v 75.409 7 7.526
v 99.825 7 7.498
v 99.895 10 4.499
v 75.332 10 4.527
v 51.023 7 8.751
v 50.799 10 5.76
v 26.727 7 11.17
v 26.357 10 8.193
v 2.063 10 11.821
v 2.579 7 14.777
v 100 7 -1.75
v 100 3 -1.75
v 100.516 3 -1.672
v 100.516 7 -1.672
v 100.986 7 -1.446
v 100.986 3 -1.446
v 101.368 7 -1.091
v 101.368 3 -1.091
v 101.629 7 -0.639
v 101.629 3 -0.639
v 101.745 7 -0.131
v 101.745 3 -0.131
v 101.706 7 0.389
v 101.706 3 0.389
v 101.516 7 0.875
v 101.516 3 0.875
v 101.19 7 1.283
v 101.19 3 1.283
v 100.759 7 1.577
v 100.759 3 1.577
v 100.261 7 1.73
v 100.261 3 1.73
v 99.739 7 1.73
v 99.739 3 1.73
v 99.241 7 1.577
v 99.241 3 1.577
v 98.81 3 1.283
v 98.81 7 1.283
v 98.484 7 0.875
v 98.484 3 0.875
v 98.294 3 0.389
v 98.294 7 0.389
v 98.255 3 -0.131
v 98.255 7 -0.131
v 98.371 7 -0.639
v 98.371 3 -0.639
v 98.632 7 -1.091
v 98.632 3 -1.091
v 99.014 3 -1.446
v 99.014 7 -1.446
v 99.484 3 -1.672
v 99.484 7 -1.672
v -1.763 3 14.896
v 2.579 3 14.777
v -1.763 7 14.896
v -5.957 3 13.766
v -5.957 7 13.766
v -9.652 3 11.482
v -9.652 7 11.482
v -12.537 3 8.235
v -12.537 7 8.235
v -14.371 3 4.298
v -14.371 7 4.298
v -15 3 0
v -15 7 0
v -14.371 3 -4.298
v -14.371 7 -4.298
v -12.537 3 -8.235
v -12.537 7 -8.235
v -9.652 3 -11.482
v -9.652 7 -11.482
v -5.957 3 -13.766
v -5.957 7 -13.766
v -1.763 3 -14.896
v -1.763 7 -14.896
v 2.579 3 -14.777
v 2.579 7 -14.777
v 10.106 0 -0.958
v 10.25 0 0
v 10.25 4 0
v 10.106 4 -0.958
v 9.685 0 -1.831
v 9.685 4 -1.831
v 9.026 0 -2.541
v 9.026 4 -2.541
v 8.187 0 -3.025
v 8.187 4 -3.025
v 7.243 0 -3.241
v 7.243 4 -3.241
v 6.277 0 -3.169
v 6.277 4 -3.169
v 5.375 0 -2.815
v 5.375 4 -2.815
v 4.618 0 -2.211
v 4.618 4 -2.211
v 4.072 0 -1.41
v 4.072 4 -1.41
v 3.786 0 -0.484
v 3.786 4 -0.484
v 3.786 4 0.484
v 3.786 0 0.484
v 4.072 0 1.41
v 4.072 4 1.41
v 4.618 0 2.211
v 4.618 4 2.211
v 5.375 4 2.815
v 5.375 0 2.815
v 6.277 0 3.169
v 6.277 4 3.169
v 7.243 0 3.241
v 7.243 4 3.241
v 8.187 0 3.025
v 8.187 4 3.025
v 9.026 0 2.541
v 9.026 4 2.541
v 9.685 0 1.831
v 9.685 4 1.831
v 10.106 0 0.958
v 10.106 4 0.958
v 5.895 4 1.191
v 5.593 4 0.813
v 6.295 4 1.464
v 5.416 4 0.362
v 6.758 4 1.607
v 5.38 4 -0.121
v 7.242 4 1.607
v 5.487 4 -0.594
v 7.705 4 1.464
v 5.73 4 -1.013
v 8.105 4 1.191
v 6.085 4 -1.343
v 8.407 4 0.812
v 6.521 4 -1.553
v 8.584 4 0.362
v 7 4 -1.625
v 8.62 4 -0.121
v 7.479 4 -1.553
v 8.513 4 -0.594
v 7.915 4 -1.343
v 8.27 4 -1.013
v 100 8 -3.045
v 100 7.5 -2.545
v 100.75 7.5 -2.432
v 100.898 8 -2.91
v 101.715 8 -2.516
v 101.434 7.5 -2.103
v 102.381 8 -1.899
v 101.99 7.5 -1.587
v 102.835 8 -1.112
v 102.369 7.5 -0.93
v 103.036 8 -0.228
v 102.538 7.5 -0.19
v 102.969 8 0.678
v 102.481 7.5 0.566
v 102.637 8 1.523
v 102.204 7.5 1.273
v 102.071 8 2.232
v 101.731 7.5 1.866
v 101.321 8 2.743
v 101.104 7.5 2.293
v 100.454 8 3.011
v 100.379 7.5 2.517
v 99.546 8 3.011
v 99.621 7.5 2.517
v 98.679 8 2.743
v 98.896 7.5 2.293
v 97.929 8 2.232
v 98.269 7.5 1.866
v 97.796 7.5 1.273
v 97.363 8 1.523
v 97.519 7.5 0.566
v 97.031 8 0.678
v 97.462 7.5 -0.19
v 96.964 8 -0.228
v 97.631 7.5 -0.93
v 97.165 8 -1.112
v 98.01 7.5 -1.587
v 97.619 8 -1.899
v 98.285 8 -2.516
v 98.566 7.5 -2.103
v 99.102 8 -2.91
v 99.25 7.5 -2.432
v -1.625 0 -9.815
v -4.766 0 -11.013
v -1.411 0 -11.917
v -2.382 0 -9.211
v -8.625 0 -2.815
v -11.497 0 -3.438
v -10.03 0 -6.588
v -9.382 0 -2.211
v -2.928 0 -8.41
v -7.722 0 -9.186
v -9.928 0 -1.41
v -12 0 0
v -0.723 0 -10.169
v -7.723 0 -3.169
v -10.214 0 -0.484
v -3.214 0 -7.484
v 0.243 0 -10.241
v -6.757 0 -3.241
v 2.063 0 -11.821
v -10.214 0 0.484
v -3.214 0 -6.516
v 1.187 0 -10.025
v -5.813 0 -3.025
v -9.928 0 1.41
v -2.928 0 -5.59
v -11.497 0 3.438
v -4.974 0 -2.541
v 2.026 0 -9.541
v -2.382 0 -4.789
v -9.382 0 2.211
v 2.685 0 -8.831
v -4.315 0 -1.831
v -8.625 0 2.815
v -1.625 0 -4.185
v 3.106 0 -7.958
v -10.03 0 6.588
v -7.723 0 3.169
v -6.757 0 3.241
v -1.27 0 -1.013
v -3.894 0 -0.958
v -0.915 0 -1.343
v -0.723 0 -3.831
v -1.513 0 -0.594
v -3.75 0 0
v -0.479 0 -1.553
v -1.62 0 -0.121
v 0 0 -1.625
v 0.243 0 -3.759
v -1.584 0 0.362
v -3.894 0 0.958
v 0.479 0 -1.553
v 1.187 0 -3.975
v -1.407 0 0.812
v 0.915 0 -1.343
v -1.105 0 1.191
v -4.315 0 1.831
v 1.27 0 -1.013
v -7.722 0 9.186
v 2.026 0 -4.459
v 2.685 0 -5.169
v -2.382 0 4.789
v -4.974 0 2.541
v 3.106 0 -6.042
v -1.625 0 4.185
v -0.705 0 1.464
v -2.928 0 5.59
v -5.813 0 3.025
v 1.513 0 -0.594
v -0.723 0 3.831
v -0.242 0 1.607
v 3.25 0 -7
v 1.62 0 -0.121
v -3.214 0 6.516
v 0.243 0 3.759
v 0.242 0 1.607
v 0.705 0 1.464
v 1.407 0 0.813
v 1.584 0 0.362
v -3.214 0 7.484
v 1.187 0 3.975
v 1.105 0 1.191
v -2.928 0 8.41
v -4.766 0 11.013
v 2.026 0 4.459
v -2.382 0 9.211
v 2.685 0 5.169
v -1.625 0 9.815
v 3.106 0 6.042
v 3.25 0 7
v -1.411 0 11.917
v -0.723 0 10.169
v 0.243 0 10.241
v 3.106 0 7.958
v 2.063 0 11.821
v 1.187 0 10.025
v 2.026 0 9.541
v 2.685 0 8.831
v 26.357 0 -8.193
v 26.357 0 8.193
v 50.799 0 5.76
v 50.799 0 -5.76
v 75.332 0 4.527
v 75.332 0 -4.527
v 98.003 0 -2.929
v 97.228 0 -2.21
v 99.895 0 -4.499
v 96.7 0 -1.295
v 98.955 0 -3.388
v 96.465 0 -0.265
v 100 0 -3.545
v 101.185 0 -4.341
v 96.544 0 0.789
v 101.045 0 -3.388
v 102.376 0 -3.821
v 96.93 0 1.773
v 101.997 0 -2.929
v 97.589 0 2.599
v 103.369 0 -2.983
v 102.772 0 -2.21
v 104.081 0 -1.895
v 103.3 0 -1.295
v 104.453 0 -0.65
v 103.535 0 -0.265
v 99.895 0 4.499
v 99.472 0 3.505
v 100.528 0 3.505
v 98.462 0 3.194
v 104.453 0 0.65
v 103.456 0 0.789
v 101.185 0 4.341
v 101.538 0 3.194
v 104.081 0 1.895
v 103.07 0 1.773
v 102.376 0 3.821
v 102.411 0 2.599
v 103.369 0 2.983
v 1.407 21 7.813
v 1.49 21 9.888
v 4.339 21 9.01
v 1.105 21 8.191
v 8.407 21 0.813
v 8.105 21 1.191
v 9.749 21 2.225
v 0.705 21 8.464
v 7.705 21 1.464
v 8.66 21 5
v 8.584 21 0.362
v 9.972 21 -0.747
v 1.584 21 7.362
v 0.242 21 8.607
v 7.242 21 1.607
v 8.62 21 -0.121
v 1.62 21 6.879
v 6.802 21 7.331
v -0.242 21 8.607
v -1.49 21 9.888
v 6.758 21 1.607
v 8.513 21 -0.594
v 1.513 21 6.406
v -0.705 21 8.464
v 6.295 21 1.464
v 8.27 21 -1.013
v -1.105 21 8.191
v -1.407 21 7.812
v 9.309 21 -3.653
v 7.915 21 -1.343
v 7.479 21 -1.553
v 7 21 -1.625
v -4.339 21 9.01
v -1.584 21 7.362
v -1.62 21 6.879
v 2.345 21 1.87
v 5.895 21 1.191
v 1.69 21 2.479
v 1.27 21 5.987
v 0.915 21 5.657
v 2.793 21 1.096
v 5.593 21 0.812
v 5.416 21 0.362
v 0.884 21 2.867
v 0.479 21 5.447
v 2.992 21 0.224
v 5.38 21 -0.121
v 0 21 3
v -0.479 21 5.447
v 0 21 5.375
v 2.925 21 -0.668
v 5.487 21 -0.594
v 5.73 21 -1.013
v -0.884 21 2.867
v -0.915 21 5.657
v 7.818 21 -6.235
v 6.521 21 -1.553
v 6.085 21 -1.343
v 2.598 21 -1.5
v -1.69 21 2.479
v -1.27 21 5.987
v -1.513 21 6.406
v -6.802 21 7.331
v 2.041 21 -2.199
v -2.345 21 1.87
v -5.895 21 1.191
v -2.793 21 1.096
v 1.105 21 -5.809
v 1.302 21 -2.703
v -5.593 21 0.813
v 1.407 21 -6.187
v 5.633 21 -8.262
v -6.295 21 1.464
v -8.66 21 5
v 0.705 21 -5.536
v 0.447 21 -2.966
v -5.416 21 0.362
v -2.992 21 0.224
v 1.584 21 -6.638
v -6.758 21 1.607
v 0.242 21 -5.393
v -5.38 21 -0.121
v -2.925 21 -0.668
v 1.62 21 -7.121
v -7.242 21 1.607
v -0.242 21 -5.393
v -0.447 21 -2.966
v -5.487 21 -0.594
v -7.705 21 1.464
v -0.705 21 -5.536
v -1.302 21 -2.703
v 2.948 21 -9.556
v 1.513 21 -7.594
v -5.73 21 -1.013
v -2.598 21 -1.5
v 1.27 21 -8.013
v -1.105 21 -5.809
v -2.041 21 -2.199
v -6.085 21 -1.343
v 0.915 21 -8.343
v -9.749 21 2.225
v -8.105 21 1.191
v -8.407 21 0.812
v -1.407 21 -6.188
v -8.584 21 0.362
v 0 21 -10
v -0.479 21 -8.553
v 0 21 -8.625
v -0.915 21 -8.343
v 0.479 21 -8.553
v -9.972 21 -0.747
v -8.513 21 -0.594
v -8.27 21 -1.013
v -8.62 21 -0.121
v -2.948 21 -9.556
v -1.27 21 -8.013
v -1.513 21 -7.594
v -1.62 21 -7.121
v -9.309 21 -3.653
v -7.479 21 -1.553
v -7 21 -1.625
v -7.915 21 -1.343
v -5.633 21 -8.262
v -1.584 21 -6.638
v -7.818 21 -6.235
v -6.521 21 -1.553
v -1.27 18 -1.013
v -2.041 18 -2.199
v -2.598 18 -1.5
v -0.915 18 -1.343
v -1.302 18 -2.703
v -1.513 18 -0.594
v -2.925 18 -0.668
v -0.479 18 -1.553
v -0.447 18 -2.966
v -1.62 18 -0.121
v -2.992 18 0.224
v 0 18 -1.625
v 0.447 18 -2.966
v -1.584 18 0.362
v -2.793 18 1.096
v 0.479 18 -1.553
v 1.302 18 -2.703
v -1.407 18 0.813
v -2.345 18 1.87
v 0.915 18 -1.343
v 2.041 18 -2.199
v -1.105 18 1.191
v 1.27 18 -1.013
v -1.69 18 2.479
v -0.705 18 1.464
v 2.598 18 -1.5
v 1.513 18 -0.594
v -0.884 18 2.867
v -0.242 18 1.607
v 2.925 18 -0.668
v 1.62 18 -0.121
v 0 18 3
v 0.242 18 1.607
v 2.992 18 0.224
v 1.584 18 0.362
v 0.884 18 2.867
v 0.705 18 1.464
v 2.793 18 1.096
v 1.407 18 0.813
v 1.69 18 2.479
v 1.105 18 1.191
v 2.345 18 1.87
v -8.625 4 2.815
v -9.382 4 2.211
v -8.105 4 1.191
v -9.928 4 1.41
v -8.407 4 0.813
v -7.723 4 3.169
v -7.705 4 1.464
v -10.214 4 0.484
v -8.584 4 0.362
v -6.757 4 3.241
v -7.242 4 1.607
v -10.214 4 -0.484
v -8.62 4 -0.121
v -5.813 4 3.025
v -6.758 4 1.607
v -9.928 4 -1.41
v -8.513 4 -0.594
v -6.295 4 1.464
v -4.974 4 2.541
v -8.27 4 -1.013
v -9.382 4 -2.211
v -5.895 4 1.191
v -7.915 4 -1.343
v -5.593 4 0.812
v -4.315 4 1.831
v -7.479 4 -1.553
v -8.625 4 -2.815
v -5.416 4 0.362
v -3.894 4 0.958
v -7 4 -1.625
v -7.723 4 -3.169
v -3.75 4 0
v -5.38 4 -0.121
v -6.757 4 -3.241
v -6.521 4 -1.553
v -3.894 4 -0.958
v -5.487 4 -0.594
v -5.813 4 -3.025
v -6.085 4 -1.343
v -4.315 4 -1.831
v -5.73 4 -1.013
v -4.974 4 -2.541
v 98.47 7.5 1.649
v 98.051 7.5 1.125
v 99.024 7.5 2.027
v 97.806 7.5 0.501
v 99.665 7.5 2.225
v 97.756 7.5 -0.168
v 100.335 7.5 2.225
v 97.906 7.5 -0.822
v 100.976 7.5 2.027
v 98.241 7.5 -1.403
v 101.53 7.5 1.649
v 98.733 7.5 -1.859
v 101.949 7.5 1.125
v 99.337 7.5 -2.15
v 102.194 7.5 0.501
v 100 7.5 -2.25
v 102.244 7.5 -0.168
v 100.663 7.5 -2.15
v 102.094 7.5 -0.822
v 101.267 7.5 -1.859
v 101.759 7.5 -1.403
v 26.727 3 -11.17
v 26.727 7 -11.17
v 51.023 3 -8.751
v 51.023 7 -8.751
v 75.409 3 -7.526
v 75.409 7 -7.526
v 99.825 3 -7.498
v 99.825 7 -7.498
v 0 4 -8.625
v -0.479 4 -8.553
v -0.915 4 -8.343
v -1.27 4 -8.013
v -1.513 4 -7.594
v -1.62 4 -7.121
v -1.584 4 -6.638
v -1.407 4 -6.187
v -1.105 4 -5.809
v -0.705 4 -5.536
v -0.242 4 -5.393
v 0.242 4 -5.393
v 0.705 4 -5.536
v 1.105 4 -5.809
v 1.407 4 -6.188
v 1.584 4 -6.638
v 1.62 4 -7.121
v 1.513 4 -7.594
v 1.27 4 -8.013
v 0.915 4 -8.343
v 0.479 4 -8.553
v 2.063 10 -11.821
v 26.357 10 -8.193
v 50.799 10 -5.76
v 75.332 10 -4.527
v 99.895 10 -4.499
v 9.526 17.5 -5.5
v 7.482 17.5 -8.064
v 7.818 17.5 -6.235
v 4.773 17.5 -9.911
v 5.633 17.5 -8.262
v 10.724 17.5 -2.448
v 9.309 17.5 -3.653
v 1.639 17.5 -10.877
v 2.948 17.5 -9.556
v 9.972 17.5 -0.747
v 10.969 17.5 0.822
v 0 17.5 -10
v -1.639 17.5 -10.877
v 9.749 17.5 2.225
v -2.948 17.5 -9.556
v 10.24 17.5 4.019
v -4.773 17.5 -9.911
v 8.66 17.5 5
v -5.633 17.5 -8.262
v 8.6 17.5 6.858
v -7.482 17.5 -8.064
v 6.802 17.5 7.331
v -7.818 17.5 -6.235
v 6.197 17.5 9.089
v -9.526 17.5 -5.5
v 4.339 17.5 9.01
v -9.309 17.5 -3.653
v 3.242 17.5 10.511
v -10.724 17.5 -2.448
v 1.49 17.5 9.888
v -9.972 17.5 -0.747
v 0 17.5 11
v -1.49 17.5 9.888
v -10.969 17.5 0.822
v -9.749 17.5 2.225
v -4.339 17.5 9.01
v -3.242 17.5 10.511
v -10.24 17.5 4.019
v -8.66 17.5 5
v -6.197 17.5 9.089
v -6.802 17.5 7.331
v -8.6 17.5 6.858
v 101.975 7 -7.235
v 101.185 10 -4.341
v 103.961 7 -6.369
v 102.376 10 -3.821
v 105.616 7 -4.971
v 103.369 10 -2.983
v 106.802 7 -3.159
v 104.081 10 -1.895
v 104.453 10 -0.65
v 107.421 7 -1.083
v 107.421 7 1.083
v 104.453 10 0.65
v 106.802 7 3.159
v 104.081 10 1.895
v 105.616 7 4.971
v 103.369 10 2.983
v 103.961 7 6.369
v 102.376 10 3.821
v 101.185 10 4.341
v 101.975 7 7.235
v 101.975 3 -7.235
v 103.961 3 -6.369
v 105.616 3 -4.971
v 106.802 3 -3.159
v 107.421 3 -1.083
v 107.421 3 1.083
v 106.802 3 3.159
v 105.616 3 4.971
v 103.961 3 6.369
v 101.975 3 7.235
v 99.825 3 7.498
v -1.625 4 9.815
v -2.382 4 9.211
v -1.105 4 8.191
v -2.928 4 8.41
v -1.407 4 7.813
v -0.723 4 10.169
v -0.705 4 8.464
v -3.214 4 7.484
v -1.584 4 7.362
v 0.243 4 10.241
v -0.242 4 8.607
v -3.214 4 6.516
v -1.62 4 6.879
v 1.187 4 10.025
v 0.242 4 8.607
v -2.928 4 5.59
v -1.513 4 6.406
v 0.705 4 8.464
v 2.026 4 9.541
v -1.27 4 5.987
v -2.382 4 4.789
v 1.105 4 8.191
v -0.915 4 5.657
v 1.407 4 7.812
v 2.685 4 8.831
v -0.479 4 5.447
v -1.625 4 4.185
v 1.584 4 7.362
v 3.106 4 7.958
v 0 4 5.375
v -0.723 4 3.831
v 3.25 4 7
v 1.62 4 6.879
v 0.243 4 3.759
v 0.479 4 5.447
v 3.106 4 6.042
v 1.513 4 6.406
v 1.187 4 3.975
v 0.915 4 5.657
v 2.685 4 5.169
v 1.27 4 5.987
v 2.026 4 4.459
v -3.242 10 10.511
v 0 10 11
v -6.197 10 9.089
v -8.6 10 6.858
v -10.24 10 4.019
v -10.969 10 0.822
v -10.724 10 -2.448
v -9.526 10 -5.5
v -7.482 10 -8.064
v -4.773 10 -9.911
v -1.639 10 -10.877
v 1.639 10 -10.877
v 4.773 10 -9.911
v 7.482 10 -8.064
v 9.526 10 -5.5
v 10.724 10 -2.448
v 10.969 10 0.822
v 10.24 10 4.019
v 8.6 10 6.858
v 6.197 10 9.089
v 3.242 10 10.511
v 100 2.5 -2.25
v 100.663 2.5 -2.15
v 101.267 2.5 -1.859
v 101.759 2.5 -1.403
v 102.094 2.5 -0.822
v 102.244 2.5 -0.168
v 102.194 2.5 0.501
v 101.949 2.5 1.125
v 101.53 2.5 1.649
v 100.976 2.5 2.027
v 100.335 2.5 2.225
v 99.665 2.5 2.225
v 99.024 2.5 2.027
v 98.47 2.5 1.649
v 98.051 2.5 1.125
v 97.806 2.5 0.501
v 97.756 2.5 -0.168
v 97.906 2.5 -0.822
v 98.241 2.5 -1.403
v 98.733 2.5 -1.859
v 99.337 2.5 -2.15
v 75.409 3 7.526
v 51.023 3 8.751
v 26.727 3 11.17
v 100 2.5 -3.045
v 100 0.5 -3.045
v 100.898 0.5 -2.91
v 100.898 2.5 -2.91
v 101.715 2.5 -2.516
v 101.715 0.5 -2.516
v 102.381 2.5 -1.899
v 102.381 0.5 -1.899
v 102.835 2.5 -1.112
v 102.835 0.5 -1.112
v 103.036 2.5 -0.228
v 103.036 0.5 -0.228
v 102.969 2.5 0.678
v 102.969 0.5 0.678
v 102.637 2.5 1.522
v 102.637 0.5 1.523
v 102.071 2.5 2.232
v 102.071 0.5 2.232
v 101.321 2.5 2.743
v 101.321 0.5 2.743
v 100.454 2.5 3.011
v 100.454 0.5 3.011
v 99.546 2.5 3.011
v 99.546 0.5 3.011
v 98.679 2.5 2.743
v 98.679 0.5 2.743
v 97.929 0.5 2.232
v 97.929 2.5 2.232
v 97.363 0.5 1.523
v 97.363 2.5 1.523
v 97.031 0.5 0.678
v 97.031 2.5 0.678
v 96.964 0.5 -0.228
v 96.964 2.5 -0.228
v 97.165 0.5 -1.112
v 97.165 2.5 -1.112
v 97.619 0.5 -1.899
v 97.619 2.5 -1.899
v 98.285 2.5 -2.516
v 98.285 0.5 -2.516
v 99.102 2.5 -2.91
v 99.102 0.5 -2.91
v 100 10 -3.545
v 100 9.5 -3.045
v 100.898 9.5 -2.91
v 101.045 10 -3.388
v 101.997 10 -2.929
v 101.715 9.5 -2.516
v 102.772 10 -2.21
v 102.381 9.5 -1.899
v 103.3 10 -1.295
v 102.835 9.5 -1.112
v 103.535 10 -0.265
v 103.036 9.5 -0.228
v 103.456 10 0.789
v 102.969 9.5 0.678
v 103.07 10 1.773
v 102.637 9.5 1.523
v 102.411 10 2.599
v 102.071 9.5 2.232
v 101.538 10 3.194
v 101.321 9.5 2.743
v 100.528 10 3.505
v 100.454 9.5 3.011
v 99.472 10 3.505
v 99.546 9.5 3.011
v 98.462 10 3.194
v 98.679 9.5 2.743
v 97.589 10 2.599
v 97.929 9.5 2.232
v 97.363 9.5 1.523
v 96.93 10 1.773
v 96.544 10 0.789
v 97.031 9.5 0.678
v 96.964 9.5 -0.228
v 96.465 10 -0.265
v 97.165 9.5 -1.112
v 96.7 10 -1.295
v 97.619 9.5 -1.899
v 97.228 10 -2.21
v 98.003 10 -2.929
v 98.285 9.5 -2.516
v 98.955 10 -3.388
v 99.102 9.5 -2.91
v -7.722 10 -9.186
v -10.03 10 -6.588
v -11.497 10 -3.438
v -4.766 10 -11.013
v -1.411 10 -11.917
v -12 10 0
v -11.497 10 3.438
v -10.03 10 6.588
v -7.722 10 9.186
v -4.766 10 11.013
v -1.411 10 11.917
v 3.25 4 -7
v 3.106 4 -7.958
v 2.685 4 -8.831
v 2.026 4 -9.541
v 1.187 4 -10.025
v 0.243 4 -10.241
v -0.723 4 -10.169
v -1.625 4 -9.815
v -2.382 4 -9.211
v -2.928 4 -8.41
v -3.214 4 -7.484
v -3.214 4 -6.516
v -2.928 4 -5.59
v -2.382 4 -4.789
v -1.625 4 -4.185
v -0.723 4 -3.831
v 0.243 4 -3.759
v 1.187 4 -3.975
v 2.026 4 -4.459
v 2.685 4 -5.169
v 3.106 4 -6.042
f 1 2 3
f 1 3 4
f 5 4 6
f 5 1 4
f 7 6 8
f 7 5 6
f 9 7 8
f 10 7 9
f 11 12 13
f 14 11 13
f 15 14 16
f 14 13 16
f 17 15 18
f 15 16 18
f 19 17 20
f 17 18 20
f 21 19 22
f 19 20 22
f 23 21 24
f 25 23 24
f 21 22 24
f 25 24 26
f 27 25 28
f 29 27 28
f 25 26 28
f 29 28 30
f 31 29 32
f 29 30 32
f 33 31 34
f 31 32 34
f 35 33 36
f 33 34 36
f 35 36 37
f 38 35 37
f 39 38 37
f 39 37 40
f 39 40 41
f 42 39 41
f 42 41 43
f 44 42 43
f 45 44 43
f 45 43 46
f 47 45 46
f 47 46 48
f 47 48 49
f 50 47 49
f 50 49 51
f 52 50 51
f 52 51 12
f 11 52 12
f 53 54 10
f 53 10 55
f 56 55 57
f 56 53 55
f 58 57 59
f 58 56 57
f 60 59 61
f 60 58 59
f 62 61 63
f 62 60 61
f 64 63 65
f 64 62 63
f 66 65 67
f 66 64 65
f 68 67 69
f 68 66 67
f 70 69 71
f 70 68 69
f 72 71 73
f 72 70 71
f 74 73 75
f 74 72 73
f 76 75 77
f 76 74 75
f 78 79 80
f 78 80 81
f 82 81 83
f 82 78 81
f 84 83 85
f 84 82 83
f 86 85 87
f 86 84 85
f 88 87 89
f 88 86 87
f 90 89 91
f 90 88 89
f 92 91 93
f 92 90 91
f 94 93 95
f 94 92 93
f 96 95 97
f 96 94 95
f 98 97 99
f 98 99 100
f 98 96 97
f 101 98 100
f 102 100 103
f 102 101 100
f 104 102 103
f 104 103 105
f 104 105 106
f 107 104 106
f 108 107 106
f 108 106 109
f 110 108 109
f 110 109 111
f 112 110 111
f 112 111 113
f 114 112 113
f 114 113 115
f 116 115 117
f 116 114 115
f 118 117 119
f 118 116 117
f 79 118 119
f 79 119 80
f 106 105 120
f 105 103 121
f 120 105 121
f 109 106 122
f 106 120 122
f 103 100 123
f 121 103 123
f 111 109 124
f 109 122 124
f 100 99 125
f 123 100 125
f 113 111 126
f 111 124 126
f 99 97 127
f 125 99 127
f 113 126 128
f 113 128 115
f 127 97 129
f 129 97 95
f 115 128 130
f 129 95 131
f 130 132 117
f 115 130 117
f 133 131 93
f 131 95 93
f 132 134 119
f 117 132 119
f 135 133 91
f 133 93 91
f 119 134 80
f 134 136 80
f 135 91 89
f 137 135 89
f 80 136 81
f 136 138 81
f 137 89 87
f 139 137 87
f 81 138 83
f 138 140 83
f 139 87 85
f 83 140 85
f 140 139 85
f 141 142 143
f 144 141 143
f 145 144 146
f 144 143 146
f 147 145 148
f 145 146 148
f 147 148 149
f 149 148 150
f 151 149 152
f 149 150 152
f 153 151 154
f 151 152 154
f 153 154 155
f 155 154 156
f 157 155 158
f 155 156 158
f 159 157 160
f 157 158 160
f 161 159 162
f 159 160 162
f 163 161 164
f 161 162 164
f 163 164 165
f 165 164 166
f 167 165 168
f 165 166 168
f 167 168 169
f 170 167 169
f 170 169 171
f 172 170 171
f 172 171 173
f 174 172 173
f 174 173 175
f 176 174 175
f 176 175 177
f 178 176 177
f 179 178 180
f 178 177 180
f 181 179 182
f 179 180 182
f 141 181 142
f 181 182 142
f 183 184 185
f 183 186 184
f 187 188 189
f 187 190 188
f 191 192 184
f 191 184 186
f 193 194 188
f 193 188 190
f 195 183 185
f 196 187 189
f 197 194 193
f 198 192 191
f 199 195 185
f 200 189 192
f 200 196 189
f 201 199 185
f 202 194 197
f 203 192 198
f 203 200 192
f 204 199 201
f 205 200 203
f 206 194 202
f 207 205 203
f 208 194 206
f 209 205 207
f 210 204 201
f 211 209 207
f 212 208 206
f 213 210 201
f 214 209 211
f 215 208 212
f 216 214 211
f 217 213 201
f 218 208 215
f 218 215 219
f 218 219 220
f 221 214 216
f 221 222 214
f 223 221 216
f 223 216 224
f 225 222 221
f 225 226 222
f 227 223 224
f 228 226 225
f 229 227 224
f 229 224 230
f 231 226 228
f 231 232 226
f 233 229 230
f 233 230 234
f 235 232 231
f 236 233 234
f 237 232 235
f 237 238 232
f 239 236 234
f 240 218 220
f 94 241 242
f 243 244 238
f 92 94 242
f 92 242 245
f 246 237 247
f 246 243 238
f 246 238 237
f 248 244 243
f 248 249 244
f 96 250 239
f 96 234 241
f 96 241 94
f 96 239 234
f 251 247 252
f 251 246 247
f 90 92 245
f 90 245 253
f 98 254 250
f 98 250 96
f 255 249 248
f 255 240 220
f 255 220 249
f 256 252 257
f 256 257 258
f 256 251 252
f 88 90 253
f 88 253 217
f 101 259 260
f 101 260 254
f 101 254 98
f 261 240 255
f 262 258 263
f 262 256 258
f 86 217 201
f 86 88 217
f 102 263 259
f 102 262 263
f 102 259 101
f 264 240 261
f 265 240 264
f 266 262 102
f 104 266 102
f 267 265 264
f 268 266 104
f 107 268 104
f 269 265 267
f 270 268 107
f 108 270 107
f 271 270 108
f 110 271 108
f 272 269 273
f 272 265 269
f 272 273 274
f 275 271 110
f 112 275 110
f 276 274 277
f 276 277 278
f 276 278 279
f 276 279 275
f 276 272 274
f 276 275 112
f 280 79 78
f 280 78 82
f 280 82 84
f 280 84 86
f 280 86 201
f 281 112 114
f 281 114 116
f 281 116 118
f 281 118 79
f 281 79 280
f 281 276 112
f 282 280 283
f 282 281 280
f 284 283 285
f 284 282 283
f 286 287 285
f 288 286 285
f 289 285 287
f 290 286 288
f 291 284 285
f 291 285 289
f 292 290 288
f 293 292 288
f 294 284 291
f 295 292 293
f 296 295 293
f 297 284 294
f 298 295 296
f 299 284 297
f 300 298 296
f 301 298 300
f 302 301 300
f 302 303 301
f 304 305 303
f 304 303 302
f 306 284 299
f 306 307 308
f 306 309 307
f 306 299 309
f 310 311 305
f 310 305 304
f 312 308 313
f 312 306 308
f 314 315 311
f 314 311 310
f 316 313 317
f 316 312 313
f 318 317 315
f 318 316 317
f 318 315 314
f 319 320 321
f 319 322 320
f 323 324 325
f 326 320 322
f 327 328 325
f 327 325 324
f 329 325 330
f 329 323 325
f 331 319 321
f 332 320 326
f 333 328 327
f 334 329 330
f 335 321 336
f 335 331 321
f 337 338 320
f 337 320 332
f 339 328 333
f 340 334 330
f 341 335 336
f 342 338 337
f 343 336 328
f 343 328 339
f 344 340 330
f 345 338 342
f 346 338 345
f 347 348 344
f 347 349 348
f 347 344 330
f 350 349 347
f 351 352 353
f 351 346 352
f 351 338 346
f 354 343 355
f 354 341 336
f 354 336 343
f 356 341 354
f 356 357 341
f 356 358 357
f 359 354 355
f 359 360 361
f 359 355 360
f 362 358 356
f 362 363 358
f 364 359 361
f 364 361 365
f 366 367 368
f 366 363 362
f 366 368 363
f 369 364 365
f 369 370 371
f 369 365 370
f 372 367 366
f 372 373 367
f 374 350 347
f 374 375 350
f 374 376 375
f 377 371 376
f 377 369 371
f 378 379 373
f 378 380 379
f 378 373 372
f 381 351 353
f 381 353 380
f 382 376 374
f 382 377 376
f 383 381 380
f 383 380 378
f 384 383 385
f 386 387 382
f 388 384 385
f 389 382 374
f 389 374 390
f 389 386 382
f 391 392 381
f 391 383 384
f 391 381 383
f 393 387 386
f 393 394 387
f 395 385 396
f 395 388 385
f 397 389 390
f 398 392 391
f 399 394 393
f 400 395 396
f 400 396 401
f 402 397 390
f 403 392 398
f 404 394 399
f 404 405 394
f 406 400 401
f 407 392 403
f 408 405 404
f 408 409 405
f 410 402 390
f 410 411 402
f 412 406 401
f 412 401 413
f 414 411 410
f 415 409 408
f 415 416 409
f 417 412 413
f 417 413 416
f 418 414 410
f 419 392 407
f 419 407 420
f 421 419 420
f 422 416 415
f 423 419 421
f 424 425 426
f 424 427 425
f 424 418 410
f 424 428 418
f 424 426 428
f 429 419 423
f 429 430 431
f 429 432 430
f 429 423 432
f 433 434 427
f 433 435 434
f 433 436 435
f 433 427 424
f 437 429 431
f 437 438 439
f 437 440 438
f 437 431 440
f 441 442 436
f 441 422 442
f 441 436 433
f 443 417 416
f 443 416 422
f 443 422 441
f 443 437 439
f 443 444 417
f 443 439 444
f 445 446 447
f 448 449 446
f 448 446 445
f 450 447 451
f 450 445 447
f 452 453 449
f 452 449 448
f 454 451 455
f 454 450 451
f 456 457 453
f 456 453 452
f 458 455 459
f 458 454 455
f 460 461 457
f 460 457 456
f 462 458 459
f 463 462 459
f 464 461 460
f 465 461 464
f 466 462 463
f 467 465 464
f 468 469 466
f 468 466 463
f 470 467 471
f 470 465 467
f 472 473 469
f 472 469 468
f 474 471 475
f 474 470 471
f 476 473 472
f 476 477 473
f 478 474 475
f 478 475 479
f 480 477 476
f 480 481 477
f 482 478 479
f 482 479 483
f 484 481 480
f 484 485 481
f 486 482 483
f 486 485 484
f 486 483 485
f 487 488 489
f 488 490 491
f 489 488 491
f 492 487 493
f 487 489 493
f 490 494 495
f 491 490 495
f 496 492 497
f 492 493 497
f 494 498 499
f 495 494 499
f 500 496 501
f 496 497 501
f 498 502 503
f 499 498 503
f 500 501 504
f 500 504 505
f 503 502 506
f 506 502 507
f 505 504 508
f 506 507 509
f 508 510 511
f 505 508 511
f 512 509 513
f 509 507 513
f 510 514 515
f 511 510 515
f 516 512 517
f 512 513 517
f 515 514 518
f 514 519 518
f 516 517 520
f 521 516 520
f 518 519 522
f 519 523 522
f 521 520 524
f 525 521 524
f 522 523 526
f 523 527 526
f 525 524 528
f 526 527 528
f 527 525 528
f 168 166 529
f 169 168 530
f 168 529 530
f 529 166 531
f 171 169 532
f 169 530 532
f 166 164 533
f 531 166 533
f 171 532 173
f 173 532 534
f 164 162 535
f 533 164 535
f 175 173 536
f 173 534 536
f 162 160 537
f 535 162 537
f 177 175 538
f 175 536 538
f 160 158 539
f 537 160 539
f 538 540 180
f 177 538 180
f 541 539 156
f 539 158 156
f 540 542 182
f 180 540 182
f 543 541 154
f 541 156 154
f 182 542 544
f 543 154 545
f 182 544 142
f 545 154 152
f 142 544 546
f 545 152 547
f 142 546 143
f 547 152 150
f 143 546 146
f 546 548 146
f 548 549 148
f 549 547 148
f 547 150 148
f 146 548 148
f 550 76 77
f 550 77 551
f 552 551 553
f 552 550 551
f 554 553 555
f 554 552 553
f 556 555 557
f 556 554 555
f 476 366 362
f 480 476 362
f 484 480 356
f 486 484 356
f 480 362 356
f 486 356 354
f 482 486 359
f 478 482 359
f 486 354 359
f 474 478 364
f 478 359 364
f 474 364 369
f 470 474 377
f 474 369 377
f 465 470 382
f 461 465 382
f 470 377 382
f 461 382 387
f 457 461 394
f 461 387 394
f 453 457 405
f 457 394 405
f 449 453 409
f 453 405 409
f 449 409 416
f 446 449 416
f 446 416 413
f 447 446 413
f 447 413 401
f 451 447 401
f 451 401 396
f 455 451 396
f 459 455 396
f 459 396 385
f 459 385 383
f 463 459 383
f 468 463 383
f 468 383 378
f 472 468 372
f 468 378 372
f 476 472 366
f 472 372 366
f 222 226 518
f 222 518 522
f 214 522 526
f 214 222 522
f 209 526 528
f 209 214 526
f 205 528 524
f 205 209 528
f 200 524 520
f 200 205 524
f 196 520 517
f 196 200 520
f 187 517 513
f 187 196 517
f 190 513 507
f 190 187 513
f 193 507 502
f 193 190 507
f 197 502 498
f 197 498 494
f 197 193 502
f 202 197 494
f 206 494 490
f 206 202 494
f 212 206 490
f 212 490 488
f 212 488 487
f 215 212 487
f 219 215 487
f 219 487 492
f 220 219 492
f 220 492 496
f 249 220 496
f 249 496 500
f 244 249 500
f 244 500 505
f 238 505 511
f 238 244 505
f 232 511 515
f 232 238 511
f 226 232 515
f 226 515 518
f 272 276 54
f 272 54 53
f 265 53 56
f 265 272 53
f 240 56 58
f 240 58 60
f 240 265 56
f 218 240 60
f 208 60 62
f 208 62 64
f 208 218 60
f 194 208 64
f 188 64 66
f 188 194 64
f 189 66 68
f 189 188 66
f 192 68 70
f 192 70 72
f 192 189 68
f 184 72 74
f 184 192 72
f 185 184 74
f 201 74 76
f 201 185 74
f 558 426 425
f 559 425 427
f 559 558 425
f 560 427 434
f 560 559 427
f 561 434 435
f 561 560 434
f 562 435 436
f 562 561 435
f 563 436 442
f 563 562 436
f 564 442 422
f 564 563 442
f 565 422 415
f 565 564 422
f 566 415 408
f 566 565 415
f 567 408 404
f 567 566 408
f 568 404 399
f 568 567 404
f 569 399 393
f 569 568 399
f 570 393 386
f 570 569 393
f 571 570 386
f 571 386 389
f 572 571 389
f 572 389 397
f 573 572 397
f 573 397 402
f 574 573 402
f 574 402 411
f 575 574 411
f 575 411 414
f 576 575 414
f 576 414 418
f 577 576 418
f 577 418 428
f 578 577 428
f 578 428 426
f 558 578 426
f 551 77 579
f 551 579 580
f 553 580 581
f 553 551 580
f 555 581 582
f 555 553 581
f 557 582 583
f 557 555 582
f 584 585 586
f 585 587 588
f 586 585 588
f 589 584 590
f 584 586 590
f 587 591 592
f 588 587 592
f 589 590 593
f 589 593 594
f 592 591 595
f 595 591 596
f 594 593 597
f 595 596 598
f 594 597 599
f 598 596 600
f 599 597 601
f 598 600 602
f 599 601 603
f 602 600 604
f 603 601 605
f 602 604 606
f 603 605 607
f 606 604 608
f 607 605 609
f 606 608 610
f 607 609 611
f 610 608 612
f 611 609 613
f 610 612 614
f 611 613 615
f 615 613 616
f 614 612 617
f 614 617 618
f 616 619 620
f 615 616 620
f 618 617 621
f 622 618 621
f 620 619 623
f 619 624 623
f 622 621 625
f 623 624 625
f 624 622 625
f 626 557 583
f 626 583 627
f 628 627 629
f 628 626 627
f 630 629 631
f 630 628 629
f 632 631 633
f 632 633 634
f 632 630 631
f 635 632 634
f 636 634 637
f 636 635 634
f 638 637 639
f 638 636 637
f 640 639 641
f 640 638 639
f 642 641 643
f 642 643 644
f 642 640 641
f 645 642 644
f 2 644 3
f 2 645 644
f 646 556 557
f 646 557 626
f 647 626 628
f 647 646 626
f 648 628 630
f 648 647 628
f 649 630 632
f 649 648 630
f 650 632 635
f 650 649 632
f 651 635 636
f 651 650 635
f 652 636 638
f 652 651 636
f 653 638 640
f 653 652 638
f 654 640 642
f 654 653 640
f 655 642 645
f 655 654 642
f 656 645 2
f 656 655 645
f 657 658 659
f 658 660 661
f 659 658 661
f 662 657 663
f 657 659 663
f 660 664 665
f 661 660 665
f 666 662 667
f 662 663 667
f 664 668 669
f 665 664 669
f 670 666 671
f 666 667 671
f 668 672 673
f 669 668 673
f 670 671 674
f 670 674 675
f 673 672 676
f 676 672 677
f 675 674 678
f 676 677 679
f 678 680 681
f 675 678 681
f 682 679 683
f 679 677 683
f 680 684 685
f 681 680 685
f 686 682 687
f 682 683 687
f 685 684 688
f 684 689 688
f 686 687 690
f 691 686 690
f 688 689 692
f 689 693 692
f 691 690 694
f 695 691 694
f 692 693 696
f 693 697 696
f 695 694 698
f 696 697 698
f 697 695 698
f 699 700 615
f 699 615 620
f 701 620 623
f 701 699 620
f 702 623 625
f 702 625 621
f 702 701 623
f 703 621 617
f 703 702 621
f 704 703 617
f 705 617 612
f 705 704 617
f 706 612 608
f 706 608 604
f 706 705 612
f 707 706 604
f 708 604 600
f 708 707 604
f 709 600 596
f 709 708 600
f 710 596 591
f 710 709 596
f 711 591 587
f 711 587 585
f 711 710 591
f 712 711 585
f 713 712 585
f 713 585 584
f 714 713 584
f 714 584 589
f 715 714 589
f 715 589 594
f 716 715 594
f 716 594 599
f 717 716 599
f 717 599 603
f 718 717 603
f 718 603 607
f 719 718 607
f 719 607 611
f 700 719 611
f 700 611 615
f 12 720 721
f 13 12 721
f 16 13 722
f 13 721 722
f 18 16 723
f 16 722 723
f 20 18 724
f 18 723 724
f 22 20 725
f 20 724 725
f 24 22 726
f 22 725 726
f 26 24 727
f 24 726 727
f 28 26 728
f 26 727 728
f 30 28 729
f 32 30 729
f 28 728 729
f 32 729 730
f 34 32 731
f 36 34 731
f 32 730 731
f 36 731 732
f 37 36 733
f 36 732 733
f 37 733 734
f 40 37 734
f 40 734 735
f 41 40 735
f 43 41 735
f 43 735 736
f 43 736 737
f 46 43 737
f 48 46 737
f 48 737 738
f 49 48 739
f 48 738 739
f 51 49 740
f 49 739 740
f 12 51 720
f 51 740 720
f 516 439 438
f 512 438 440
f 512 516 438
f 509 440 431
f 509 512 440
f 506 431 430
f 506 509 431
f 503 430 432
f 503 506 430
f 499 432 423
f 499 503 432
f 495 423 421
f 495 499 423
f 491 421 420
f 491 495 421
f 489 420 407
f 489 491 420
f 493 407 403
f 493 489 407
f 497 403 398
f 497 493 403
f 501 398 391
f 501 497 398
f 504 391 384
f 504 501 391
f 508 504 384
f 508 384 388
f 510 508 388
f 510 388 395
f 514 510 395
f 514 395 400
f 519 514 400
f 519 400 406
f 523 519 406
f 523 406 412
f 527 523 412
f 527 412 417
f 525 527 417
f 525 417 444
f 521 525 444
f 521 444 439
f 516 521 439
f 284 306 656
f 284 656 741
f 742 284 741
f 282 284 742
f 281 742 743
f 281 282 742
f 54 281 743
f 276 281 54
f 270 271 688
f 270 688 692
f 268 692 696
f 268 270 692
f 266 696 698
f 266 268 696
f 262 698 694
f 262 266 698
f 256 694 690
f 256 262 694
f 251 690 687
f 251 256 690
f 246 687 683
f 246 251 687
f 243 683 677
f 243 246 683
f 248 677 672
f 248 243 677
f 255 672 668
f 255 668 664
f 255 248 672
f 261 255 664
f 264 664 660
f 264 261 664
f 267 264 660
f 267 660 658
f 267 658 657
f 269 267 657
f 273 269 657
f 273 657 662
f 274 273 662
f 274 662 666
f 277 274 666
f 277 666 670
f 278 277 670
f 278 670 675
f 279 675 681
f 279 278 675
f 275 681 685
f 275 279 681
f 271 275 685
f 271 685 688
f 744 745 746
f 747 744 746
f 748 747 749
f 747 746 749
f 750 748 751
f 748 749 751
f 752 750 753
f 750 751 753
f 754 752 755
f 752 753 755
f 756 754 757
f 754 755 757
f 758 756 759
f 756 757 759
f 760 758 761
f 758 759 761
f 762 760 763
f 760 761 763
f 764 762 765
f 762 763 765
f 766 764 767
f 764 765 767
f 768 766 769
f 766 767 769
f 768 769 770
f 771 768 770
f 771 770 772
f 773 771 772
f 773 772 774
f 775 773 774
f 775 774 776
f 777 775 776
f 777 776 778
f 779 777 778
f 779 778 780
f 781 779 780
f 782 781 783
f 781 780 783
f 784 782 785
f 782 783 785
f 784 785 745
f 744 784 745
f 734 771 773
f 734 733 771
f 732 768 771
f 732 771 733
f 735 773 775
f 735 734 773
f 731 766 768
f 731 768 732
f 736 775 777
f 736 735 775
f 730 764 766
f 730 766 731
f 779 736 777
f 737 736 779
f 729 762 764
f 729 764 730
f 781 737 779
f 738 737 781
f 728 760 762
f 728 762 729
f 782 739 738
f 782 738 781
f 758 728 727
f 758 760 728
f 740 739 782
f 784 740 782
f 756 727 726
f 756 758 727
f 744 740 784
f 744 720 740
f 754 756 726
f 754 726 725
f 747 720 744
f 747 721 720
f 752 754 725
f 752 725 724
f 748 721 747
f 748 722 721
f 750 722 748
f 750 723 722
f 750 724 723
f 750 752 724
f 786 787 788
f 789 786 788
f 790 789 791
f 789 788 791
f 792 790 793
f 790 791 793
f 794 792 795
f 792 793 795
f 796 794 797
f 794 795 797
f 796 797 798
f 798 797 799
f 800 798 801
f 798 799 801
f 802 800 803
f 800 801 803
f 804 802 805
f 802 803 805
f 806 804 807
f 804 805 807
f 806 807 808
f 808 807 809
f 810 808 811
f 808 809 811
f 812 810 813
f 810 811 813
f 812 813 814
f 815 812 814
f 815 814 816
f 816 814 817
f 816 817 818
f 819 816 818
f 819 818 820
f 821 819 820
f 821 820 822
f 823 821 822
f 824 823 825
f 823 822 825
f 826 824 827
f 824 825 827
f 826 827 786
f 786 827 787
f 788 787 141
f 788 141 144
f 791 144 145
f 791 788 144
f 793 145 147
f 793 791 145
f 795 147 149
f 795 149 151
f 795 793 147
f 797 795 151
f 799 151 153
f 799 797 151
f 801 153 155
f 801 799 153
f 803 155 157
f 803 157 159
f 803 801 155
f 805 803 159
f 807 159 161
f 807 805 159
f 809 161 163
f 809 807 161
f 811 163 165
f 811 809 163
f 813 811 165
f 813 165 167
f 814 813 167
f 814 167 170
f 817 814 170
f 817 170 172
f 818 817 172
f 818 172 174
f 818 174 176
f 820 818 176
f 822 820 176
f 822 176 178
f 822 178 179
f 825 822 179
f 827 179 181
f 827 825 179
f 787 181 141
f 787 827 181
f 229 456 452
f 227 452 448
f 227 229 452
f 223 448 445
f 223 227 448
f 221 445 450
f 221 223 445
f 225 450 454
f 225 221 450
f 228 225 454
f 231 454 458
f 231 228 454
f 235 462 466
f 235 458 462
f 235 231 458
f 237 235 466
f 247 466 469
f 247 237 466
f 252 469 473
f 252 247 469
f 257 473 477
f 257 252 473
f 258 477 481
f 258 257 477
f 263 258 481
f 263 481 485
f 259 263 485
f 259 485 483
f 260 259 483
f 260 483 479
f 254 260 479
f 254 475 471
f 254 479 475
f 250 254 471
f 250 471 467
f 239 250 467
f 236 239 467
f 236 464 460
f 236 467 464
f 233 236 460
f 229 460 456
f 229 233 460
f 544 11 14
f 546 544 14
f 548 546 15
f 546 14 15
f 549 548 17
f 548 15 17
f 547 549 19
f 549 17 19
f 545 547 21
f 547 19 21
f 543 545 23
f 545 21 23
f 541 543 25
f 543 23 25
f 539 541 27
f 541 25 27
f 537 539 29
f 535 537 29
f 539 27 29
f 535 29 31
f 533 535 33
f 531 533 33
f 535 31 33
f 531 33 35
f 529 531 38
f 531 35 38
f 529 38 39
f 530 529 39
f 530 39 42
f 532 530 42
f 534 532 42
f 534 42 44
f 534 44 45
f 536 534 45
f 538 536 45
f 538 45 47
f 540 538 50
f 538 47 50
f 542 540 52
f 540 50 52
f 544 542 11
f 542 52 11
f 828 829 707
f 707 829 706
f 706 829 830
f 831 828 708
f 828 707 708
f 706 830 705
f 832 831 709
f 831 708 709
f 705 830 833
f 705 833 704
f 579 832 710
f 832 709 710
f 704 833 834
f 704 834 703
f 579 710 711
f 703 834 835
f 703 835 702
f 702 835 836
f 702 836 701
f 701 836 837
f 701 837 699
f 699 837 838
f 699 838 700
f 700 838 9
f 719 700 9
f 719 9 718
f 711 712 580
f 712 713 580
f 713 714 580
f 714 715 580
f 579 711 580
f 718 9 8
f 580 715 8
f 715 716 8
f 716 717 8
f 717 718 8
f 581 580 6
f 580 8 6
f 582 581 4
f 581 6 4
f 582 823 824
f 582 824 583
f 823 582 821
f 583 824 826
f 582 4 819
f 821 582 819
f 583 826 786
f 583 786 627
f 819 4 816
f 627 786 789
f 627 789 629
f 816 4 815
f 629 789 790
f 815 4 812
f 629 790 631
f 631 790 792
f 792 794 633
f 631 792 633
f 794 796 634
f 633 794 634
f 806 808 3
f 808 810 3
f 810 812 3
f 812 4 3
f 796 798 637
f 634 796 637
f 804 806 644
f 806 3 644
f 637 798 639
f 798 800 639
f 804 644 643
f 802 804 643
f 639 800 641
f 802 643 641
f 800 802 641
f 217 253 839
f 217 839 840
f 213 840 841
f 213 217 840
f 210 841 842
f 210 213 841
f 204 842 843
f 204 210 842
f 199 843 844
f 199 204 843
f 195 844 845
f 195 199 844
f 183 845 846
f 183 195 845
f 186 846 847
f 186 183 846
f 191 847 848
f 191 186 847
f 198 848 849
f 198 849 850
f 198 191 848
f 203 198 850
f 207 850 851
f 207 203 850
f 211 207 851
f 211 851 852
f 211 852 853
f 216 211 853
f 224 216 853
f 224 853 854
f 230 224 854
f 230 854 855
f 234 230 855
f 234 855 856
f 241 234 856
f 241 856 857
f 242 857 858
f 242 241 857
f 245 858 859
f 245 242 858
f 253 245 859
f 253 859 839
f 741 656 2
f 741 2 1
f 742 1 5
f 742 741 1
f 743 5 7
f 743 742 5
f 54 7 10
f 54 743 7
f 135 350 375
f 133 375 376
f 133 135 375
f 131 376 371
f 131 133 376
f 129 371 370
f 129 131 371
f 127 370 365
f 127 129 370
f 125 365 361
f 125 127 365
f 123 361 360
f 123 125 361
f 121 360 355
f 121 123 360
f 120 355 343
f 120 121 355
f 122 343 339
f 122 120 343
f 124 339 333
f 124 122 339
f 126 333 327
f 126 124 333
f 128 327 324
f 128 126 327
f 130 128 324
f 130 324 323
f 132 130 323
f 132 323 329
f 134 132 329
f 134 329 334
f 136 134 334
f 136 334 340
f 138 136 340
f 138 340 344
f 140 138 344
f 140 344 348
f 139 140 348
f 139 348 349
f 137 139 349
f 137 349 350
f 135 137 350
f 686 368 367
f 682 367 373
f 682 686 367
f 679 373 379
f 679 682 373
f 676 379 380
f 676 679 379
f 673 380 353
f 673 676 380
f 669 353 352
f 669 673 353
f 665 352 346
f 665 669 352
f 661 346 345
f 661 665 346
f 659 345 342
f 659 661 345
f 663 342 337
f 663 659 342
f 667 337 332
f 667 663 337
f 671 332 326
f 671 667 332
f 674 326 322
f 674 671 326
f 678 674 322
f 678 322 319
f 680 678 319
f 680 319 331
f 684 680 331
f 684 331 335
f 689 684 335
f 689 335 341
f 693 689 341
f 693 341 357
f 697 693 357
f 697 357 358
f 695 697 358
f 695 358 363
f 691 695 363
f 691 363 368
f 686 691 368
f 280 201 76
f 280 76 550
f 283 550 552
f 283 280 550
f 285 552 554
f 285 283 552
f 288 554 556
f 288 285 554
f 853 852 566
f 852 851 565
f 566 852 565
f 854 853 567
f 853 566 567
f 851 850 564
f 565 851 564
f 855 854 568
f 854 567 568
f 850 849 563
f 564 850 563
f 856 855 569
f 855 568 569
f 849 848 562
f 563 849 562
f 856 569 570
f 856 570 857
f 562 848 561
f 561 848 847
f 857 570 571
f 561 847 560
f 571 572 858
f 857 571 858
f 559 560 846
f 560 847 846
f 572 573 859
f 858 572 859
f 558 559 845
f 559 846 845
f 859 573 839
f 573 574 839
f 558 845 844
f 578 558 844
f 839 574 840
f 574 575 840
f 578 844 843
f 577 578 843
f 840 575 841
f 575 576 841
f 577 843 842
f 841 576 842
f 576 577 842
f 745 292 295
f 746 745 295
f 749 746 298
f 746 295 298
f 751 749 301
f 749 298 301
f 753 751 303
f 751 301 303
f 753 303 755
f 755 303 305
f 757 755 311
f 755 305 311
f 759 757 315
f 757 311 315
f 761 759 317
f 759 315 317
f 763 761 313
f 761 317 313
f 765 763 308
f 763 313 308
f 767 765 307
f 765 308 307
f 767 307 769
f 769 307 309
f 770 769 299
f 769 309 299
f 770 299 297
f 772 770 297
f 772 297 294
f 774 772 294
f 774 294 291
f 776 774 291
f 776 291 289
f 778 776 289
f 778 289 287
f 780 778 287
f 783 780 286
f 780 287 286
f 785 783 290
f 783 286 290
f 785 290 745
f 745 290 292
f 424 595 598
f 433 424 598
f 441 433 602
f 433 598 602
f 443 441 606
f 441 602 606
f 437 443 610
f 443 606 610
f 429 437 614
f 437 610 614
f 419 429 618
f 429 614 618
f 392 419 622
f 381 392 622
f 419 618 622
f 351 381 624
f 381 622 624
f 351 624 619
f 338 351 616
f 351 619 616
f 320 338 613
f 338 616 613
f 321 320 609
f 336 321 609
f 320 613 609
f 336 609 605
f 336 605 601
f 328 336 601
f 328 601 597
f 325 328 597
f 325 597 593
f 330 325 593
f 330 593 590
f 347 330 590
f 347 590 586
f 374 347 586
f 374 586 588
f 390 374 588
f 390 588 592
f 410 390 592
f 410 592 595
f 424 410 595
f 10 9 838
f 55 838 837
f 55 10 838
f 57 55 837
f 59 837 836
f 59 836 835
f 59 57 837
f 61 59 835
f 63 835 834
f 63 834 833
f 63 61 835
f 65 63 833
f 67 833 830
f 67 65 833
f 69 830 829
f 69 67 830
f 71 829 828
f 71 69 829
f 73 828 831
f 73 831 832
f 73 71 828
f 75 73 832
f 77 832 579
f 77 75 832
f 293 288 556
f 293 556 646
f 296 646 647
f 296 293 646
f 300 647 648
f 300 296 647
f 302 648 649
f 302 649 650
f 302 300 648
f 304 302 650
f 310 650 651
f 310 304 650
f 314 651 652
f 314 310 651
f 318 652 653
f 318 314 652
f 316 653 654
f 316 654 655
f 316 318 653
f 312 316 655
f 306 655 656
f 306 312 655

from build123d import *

# Parameters (mm, degrees)
ESQUISSE1_R                = 10
ESQUISSE1_R_2              = 1.625
BOSS_EXTRU_1_DEPTH         = 21
ESQUISSE2_R                = 3
ENL_V_MAT_EXTRU_1_DEPTH    = 3
BOSS_EXTRU_2_START         = 21
ESQUISSE3_R                = 11
ESQUISSE3_R_2              = 10
BOSS_EXTRU_2_DEPTH         = 17.5
ESQUISSE4_R                = 11
BOSS_EXTRU_3_DEPTH         = 10
ESQUISSE5_R                = 3.045
ENL_V_MAT_EXTRU_2_DEPTH    = 2.5
ESQUISSE6_R                = 1.75
ENL_V_MAT_EXTRU_3_DEPTH    = 111.106766368
CHANFREIN1_SIZE            = 3
PER_AGEAVANC_2_OUTLINE_R   = 3.25
PER_AGEAVANC_2_OUTLINE_R_2 = 1.625
PER_AGEAVANC_2_DEPTH       = 4
CHANFREIN2_SIZE            = 0.5


# Read off the part's stored shape, not the designer's step: PerçageAvancé2
with BuildPart() as part:
    # Esquisse1 → Boss.-Extru.1 (new body)
    with BuildSketch(Plane(origin=(0, 0, 0), x_dir=(1, 0, 0), z_dir=(0, 1, 0))):
        with Locations(Location((0, 0, 0), (0, 0, 90))):
            Circle(ESQUISSE1_R)
        with Locations(Location((0, 7, 0), (0, 0, 90))):
            Circle(ESQUISSE1_R_2, mode=Mode.SUBTRACT)
        with Locations(Location((7, 0, 0), (0, 0, 90))):
            Circle(ESQUISSE1_R_2, mode=Mode.SUBTRACT)
        with Locations(Location((0, -7, 0), (0, 0, 90))):
            Circle(ESQUISSE1_R_2, mode=Mode.SUBTRACT)
        with Locations(Location((-7, 0, 0), (0, 0, 90))):
            Circle(ESQUISSE1_R_2, mode=Mode.SUBTRACT)
        with Locations(Location((0, 0, 0), (0, 0, 90))):
            Circle(ESQUISSE1_R_2, mode=Mode.SUBTRACT)
    extrude(amount=BOSS_EXTRU_1_DEPTH)

    # Esquisse2 → Enlèv. mat.-Extru.1 (cut)
    with BuildSketch(Plane(origin=(0, 21, 0), x_dir=(1, 0, 0), z_dir=(0, 1, 0))):
        with Locations(Location((0, 0, 0), (0, 0, 270))):
            Circle(ESQUISSE2_R)
    extrude(amount=-ENL_V_MAT_EXTRU_1_DEPTH, mode=Mode.SUBTRACT)

    # Esquisse3 → Boss.-Extru.2 (add)
    with BuildSketch(Plane.XZ.offset(-21).offset(BOSS_EXTRU_2_START)):
        with Locations(Location((0, 0, 0), (0, 0, 90))):
            Circle(ESQUISSE3_R)
        with Locations(Location((0, 0, 0), (0, 0, 270))):
            Circle(ESQUISSE3_R_2, mode=Mode.SUBTRACT)
    extrude(amount=-BOSS_EXTRU_2_DEPTH)

    # Esquisse4 → Boss.-Extru.3 (add)
    with BuildSketch(Plane.XZ):
        with BuildLine():
            ThreePointArc((2.57876462, 14.77666989), (-15, 0), (2.57876462, -14.77666989))
            ThreePointArc((2.57876462, -14.77666989), (51.023205541, -8.75124585), (99.824833086, -7.497954158))
            ThreePointArc((99.824833086, -7.497954158), (107.5, 0), (99.824833086, 7.497954158))
            ThreePointArc((99.824833086, 7.497954158), (51.023205541, 8.75124585), (2.57876462, 14.77666989))
        make_face()
        with Locations(Location((0, 0, 0), (0, 0, 270))):
            Circle(ESQUISSE4_R, mode=Mode.SUBTRACT)
    extrude(amount=-BOSS_EXTRU_3_DEPTH)

    # Esquisse5 → Enlèv. mat.-Extru.2 (cut)
    with BuildSketch(Plane.XZ):
        with Locations(Location((100, 0, 0), (0, 0, 270))):
            Circle(ESQUISSE5_R)
    enl_v_mat_extru_2 = extrude(amount=-ENL_V_MAT_EXTRU_2_DEPTH, mode=Mode.SUBTRACT)

    # Symétrie1: Enlèv. mat.-Extru.2 across plane
    add(enl_v_mat_extru_2.mirror(Plane(origin=(0, 5, 0), x_dir=(0, 0, 1), z_dir=(0, -1, 0))), mode=Mode.SUBTRACT)

    # Esquisse6 → Enlèv. mat.-Extru.3 (cut, through all)
    with BuildSketch(Plane.XZ.offset(-2.5)):
        with Locations(Location((100, 0, 0), (0, 0, 270))):
            Circle(ESQUISSE6_R)
    extrude(amount=-ENL_V_MAT_EXTRU_3_DEPTH, mode=Mode.SUBTRACT)

    # Chanfrein1
    chanfrein1_edges = [part.edges().sort_by_distance(p)[0] for p in [
        (107.5, 10, 0),
        (51.023205541, 10, -8.75124585),
        (-15, 10, 0),
        (51.023205541, 0, 8.75124585),
        (51.023205541, 10, 8.75124585),
        (107.5, 0, 0),
        (-15, 0, 0),
        (51.023205541, 0, -8.75124585),
    ]]
    chamfer(chanfrein1_edges, length=CHANFREIN1_SIZE)

    # PerçageAvancé2 outline → PerçageAvancé2 (cut)
    # profile 1 of 4: a face of its own
    with BuildSketch(Plane(origin=(0, 0, 0), x_dir=(1, 0, 0), z_dir=(0, 1, 0))):
        with Locations((-7, 0)):
            Circle(PER_AGEAVANC_2_OUTLINE_R)
        with Locations((-7, 0)):
            Circle(PER_AGEAVANC_2_OUTLINE_R_2, mode=Mode.SUBTRACT)
    # profile 2 of 4: a face of its own
    with BuildSketch(Plane(origin=(0, 0, 0), x_dir=(1, 0, 0), z_dir=(0, 1, 0))):
        with Locations((0, 7)):
            Circle(PER_AGEAVANC_2_OUTLINE_R)
        with Locations((0, 7)):
            Circle(PER_AGEAVANC_2_OUTLINE_R_2, mode=Mode.SUBTRACT)
    # profile 3 of 4: a face of its own
    with BuildSketch(Plane(origin=(0, 0, 0), x_dir=(1, 0, 0), z_dir=(0, 1, 0))):
        with Locations((0, -7)):
            Circle(PER_AGEAVANC_2_OUTLINE_R)
        with Locations((0, -7)):
            Circle(PER_AGEAVANC_2_OUTLINE_R_2, mode=Mode.SUBTRACT)
    # profile 4 of 4: a face of its own
    with BuildSketch(Plane(origin=(0, 0, 0), x_dir=(1, 0, 0), z_dir=(0, 1, 0))):
        with Locations((7, 0)):
            Circle(PER_AGEAVANC_2_OUTLINE_R)
        with Locations((7, 0)):
            Circle(PER_AGEAVANC_2_OUTLINE_R_2, mode=Mode.SUBTRACT)
    extrude(amount=PER_AGEAVANC_2_DEPTH, mode=Mode.SUBTRACT)

    # Chanfrein2
    chanfrein2_edges = [part.edges().sort_by_distance(p)[0] for p in [
        (100, 0, 3.045),
        (100, 10, 3.045),
        (100, 7.5, 3.045),
        (100, 7.5, 1.75),
        (100, 2.5, 1.75),
    ]]
    chamfer(chanfrein2_edges, length=CHANFREIN2_SIZE)


solid = part.part
